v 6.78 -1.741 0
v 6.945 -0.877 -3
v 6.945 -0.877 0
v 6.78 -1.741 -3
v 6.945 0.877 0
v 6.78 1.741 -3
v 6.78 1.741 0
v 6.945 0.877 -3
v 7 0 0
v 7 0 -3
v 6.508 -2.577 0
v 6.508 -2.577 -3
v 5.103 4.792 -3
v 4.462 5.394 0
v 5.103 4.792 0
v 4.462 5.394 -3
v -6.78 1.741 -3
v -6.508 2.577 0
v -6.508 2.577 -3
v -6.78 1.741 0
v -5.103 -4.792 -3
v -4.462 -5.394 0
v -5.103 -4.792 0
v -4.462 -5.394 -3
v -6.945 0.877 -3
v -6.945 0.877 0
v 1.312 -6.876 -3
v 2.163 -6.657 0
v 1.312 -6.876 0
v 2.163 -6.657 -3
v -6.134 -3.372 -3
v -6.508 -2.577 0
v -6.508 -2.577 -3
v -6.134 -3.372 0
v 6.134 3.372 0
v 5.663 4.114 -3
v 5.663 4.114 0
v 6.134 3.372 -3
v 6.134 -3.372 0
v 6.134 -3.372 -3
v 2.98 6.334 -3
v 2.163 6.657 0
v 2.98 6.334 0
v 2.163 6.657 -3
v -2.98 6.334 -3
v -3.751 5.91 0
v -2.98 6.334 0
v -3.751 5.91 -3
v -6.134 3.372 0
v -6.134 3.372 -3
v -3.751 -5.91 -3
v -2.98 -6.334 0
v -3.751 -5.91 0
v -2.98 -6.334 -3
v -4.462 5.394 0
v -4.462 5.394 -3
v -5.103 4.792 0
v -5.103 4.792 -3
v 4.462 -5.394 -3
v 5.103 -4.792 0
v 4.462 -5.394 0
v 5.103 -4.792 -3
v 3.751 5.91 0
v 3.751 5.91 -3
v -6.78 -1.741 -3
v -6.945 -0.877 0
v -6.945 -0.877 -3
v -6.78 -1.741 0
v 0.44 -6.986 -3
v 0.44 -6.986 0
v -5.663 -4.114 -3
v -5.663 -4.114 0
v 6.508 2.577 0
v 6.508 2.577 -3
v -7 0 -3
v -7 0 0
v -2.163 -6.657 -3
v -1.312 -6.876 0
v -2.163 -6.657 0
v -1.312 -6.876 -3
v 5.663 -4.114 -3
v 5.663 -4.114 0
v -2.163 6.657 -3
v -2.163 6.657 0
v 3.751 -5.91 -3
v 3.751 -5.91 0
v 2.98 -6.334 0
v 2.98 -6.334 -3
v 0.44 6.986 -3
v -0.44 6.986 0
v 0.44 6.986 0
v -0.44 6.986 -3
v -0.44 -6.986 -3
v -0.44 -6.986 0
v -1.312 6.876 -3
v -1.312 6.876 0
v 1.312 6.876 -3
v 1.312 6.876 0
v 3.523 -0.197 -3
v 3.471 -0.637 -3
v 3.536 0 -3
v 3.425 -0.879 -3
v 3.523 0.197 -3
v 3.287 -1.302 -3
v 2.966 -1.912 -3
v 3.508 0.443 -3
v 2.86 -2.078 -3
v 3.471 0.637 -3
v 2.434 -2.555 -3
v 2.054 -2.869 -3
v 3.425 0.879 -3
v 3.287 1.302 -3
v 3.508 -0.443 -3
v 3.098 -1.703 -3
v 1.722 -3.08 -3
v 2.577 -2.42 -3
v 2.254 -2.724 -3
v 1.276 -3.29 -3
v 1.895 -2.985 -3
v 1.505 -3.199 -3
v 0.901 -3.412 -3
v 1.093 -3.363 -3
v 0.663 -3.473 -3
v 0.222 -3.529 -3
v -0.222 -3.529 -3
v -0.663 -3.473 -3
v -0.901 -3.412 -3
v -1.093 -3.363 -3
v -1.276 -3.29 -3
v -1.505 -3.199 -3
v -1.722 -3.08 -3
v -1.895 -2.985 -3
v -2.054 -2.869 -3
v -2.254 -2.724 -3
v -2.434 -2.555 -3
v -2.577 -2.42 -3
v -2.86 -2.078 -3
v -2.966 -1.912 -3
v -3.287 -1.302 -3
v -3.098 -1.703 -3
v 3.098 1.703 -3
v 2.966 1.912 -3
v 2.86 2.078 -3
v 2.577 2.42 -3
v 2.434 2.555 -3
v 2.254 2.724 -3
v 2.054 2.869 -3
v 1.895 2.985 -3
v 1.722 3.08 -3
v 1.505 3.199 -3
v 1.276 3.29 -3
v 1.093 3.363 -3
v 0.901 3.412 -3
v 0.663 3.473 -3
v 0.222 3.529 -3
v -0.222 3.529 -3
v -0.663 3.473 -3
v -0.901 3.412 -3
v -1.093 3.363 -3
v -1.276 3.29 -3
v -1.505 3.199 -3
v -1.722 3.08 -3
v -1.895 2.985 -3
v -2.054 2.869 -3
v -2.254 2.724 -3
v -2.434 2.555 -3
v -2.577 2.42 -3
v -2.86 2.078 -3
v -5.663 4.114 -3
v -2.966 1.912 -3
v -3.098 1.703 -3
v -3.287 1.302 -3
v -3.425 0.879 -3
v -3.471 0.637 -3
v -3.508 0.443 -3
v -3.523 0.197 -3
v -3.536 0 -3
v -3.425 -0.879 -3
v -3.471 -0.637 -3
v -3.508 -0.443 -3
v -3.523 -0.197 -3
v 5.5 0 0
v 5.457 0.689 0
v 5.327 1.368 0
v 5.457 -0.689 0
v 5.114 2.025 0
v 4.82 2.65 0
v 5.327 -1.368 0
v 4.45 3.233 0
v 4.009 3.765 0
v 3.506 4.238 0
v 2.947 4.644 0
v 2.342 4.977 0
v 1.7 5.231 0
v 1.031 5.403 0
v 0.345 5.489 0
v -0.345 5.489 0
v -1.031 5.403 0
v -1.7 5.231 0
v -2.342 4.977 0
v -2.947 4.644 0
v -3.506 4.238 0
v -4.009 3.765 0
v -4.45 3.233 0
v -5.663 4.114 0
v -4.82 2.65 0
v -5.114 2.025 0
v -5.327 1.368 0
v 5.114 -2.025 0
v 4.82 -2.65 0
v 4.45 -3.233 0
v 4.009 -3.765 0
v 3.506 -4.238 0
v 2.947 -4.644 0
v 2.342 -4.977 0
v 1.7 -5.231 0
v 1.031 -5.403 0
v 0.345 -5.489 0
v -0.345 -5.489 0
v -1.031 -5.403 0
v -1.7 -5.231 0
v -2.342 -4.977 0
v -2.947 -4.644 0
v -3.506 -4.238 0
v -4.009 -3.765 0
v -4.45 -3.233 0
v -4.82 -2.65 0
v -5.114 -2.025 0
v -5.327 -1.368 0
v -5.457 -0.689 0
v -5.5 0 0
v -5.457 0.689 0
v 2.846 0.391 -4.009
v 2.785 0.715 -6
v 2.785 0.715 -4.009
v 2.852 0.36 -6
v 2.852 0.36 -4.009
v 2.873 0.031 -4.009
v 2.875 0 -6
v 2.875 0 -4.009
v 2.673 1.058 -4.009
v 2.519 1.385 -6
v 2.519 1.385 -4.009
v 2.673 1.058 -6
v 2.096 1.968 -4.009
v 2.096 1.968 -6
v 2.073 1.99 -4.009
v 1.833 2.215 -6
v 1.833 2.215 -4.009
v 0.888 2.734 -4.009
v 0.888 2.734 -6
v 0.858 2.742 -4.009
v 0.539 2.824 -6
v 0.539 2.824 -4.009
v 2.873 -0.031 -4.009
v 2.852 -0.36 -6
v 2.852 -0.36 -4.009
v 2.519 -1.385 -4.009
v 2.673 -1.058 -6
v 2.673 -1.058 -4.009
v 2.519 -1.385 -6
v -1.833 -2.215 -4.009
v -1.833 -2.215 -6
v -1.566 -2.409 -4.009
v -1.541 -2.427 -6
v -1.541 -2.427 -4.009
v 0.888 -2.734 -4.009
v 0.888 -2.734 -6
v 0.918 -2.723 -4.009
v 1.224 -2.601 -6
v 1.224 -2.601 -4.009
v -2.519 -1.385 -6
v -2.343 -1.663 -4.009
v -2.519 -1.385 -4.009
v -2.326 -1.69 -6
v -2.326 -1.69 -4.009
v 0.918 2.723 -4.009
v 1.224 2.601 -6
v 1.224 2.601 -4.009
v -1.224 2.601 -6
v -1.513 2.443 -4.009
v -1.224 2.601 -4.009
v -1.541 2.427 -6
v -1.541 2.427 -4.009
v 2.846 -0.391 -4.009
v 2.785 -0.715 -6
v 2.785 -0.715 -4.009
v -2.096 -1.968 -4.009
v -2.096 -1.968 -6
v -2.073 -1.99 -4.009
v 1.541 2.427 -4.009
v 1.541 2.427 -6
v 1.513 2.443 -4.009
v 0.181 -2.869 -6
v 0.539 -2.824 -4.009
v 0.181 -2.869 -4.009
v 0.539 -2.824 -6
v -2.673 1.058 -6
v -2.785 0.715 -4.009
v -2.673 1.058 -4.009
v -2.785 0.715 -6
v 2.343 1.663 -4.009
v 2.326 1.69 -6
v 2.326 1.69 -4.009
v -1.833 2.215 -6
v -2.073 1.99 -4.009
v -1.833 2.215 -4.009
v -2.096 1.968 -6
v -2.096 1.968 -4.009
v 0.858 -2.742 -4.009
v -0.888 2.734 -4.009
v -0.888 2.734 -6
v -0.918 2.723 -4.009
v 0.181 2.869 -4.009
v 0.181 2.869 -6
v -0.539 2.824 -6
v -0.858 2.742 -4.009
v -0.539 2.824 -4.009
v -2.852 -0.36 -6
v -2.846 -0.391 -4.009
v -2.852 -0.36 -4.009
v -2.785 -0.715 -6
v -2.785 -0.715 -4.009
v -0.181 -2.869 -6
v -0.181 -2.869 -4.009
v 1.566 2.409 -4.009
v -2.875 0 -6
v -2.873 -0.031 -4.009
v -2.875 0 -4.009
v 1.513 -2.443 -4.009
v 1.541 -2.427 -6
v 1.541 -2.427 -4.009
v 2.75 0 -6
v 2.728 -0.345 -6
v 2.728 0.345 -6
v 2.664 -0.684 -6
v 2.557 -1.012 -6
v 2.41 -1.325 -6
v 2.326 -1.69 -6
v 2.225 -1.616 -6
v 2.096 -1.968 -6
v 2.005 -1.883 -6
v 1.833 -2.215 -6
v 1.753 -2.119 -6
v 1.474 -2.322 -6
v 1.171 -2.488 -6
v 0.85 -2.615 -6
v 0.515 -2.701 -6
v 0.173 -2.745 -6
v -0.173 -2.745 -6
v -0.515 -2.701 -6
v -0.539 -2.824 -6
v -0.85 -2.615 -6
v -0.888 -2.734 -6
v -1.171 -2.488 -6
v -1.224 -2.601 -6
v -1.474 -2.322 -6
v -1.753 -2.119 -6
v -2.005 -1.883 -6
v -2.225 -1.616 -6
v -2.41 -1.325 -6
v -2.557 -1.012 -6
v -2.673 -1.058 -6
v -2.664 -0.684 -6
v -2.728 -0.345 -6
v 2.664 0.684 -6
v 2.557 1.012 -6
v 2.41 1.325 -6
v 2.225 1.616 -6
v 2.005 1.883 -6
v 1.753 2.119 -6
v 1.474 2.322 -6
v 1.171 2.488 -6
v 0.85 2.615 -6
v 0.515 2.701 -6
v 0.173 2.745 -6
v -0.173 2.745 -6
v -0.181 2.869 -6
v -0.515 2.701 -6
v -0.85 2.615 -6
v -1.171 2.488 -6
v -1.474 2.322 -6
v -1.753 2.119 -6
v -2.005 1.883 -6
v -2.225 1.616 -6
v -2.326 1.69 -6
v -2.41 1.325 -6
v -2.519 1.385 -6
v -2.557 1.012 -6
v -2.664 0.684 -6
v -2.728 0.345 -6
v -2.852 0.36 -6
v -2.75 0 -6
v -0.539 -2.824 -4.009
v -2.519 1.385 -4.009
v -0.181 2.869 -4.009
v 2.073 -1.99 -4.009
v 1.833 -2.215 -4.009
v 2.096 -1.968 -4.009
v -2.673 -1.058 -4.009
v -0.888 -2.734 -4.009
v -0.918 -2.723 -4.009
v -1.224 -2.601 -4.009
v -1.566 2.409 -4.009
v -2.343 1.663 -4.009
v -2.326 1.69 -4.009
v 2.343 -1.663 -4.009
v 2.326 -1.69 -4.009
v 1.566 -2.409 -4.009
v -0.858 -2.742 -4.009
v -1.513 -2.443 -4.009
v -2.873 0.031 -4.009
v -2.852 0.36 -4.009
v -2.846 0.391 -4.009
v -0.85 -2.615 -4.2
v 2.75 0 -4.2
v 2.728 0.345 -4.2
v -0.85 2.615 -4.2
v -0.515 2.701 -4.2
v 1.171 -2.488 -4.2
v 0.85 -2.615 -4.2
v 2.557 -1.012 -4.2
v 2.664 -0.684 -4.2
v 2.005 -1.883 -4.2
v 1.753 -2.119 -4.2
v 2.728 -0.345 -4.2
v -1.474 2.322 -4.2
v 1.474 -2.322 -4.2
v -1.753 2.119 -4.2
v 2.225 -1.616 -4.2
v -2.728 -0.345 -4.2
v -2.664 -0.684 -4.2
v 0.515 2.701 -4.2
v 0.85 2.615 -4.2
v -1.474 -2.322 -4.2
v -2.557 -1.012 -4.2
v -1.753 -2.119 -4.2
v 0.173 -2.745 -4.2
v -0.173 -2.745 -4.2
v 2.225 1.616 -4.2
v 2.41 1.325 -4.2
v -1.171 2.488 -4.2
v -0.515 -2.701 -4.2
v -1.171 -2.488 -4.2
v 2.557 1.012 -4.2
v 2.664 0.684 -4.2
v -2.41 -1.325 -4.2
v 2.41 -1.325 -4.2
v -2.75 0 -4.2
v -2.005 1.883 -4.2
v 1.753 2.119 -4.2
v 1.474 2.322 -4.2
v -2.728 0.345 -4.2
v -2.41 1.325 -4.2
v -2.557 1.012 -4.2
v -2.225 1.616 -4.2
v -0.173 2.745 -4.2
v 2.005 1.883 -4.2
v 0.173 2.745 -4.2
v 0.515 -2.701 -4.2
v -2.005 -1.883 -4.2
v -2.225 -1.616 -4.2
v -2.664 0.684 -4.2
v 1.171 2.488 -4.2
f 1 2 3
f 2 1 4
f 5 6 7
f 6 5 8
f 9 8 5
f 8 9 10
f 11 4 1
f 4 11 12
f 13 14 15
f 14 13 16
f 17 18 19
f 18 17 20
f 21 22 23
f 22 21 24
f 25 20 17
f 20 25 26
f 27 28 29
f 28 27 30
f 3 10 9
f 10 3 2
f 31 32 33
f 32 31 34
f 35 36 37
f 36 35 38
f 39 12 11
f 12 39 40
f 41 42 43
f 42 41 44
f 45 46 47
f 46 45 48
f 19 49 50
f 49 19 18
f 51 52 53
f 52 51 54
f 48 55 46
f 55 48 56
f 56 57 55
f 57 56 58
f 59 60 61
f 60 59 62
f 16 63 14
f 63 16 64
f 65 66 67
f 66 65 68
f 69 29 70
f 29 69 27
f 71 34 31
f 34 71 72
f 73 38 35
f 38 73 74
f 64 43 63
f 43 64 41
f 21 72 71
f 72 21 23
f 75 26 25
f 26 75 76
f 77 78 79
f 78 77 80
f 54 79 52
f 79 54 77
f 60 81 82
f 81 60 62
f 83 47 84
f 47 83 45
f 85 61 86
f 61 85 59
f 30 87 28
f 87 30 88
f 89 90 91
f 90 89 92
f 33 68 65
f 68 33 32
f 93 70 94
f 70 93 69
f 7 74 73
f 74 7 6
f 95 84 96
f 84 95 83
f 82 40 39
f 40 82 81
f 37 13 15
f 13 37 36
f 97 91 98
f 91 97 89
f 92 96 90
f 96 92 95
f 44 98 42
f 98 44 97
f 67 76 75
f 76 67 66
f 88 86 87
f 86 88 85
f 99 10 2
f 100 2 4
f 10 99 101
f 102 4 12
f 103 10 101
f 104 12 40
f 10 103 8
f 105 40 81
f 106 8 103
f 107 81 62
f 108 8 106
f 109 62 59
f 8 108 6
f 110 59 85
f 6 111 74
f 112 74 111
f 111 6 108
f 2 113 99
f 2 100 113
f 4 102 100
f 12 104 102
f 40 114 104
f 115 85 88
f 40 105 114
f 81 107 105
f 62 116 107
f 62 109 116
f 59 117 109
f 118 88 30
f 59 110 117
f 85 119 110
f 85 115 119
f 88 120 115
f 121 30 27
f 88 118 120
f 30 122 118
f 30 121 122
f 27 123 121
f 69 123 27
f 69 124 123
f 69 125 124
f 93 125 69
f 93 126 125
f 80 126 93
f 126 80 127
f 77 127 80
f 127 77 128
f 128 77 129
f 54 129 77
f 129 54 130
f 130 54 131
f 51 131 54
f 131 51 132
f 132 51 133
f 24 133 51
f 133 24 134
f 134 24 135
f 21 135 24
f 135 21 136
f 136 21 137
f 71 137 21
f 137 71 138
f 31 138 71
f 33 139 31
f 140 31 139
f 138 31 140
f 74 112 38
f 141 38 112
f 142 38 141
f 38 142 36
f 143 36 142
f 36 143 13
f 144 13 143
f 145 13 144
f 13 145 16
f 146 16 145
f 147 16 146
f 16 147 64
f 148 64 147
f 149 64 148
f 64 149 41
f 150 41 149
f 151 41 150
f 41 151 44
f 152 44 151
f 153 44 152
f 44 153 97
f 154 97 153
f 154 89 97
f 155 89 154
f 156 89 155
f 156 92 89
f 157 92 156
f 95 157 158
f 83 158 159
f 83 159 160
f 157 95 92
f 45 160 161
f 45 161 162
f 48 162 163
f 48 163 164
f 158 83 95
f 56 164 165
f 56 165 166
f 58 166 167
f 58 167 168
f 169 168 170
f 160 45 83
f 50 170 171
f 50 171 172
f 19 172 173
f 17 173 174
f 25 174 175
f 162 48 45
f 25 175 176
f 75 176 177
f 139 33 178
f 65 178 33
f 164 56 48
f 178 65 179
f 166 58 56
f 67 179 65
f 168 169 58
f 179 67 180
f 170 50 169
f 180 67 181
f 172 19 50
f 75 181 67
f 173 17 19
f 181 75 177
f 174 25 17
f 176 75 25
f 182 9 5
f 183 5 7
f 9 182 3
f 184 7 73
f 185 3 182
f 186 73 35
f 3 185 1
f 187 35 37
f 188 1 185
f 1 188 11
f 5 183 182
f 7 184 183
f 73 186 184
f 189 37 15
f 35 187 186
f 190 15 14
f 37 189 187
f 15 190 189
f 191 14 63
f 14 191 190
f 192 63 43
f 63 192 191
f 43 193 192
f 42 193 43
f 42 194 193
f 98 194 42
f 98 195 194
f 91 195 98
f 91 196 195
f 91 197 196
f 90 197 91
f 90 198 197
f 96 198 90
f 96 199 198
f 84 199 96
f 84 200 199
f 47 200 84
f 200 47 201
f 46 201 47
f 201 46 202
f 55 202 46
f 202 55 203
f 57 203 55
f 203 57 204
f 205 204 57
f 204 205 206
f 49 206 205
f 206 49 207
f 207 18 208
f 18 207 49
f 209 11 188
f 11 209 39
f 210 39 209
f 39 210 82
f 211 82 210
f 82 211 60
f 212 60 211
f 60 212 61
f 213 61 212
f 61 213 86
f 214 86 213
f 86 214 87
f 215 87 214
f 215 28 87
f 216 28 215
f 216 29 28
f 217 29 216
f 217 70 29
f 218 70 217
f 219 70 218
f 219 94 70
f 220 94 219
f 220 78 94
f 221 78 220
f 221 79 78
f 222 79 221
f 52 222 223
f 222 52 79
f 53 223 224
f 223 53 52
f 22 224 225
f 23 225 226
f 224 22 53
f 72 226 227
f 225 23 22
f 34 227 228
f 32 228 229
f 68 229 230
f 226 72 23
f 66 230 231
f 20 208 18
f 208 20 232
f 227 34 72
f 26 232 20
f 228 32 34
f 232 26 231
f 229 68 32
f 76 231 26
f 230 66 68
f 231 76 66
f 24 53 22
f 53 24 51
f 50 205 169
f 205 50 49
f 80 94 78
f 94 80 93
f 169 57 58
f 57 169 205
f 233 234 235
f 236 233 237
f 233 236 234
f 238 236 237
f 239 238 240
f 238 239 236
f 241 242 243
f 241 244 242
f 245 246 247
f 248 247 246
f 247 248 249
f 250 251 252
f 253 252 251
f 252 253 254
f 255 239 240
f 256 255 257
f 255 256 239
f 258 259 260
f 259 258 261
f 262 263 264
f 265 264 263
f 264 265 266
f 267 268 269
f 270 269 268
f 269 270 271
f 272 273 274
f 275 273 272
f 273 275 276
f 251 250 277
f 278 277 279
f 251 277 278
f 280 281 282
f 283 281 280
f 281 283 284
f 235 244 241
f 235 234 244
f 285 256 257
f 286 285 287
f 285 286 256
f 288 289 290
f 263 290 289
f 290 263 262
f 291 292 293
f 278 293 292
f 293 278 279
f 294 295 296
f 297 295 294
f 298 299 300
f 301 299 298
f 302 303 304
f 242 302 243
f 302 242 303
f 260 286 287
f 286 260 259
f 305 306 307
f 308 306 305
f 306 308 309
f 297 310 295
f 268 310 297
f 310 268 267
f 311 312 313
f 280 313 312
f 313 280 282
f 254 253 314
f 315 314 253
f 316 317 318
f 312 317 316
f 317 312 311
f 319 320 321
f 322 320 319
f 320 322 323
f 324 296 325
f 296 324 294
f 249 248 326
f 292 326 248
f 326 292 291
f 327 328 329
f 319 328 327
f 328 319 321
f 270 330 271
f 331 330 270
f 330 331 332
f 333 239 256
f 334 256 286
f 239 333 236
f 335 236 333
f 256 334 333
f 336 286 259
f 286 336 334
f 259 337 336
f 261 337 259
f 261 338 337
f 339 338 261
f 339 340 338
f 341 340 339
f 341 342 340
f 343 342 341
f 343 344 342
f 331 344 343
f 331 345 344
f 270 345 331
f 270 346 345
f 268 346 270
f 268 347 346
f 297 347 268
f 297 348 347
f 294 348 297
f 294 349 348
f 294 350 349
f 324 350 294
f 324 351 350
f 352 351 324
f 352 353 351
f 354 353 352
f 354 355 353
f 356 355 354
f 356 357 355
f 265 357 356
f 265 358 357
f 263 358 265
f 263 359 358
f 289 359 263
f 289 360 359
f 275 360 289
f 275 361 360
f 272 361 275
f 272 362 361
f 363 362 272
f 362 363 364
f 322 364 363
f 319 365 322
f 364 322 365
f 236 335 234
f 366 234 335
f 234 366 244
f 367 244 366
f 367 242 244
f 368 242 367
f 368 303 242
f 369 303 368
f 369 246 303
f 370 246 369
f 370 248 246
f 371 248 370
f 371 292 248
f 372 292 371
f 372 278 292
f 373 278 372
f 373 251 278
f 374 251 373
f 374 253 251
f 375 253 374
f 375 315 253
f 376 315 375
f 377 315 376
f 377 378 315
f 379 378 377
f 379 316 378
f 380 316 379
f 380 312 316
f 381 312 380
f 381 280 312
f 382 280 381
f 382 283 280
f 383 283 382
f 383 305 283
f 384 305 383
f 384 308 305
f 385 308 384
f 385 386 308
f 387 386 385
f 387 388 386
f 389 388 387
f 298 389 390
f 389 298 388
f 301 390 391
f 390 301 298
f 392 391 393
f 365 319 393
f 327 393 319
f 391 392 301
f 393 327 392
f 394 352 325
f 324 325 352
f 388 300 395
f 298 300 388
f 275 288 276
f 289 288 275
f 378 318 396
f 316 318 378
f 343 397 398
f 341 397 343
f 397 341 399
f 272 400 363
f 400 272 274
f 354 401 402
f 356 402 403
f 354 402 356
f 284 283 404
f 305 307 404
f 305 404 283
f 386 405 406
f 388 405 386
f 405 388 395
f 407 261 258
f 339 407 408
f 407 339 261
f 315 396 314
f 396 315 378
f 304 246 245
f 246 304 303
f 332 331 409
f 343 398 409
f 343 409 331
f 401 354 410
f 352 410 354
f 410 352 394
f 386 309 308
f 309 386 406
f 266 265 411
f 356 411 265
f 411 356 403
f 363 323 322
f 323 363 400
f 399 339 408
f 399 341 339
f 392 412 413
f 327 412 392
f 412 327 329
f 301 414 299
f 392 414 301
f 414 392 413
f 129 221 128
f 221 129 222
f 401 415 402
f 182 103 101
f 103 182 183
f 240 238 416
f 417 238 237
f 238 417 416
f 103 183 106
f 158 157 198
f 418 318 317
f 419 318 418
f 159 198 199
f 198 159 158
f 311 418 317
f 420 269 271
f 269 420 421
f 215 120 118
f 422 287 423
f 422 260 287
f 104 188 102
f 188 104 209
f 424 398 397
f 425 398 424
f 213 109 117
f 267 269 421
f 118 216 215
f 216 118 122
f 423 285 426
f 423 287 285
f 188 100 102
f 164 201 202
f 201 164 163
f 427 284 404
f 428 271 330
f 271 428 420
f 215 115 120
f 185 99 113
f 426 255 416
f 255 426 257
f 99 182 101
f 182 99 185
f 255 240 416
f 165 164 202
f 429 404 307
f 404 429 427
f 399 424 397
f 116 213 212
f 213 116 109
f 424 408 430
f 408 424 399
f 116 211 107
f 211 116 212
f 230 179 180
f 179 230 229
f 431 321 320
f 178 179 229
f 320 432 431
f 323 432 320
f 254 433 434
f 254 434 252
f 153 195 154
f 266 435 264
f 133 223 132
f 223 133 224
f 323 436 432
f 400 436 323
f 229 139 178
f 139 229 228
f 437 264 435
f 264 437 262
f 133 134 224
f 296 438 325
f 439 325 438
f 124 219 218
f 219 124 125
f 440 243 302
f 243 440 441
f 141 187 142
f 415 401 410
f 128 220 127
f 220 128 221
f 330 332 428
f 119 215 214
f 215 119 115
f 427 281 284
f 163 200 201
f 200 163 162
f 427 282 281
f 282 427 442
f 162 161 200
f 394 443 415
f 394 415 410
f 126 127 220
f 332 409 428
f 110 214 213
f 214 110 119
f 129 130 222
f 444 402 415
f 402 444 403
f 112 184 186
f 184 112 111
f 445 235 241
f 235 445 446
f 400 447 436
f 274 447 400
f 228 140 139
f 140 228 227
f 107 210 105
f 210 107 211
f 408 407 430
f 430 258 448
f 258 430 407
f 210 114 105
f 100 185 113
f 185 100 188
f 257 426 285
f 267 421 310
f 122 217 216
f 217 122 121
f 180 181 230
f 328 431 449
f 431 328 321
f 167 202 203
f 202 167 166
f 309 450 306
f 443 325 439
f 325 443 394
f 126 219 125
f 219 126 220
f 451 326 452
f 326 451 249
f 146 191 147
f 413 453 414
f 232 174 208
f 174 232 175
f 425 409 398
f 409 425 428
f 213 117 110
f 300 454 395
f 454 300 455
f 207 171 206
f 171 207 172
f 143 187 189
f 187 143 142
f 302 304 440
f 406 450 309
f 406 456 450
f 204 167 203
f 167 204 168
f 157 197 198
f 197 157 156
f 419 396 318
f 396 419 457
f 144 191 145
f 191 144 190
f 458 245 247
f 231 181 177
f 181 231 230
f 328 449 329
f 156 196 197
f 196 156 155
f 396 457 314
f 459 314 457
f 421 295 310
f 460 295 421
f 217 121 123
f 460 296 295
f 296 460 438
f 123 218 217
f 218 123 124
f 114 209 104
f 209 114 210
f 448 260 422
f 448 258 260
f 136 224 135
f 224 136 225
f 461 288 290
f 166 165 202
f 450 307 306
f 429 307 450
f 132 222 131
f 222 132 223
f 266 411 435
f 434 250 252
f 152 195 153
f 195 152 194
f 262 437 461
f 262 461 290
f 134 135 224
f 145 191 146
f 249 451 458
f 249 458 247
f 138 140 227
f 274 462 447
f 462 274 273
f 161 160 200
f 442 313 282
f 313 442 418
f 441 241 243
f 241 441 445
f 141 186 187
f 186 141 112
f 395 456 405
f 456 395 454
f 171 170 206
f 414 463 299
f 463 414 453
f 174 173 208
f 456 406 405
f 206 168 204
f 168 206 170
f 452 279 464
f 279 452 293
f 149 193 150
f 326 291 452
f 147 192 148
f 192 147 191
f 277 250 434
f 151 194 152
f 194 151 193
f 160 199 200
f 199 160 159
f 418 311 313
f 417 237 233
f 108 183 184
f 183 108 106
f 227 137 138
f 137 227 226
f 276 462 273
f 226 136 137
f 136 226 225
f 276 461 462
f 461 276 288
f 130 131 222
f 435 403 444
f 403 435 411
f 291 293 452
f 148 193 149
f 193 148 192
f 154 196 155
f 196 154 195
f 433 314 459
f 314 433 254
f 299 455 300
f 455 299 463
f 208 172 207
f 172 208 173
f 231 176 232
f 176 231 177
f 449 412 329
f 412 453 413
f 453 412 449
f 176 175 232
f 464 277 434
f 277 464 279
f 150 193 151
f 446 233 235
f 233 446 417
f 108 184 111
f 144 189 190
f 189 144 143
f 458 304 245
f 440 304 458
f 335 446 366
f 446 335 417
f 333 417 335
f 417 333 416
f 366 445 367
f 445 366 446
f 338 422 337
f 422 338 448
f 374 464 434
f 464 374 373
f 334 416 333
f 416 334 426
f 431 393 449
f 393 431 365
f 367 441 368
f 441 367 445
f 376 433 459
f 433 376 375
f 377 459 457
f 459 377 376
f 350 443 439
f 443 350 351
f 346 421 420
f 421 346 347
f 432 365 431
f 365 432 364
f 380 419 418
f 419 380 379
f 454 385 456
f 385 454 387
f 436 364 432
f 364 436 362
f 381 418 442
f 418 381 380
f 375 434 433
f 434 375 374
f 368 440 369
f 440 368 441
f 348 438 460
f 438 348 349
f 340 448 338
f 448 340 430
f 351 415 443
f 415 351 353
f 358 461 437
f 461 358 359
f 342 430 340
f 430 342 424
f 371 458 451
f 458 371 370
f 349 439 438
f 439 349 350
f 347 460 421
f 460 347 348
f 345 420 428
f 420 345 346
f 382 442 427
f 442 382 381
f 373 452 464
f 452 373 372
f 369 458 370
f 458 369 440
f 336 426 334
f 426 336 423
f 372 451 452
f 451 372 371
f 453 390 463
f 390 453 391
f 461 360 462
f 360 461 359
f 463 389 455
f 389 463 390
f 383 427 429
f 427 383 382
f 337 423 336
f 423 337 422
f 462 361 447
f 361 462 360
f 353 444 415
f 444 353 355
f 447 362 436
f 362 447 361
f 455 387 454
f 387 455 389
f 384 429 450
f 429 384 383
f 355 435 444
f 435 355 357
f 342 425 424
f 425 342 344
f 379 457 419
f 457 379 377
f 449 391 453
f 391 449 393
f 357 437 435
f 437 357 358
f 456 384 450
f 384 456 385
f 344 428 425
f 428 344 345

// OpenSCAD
$fn = 50;

difference() {
	union() {
		translate(v = [0, 0, -3.0]) {
			cylinder(h = 3, r = 7.0);
		}
		#translate(v = [0, 0, -6.0]) {
			cylinder(h = 6, r = 2.875);
		}
	}
	union() {
		translate(v = [0, 0, 0]) {
			rotate(a = [0, 0, 0]) {
				difference() {
					union() {
						translate(v = [0, 0, -6.0]) {
							cylinder(h = 6, r = 2.25);
						}
						translate(v = [0, 0, -4.2]) {
							cylinder(h = 4.2, r1 = 2.75, r2 = 5.5);
						}
						translate(v = [0, 0, -6.0]) {
							cylinder(h = 6, r = 2.75);
						}
						translate(v = [0, 0, -6.0]) {
							cylinder(h = 6, r = 2.25);
						}
					}
					union();
				}
			}
		}
	}
}
